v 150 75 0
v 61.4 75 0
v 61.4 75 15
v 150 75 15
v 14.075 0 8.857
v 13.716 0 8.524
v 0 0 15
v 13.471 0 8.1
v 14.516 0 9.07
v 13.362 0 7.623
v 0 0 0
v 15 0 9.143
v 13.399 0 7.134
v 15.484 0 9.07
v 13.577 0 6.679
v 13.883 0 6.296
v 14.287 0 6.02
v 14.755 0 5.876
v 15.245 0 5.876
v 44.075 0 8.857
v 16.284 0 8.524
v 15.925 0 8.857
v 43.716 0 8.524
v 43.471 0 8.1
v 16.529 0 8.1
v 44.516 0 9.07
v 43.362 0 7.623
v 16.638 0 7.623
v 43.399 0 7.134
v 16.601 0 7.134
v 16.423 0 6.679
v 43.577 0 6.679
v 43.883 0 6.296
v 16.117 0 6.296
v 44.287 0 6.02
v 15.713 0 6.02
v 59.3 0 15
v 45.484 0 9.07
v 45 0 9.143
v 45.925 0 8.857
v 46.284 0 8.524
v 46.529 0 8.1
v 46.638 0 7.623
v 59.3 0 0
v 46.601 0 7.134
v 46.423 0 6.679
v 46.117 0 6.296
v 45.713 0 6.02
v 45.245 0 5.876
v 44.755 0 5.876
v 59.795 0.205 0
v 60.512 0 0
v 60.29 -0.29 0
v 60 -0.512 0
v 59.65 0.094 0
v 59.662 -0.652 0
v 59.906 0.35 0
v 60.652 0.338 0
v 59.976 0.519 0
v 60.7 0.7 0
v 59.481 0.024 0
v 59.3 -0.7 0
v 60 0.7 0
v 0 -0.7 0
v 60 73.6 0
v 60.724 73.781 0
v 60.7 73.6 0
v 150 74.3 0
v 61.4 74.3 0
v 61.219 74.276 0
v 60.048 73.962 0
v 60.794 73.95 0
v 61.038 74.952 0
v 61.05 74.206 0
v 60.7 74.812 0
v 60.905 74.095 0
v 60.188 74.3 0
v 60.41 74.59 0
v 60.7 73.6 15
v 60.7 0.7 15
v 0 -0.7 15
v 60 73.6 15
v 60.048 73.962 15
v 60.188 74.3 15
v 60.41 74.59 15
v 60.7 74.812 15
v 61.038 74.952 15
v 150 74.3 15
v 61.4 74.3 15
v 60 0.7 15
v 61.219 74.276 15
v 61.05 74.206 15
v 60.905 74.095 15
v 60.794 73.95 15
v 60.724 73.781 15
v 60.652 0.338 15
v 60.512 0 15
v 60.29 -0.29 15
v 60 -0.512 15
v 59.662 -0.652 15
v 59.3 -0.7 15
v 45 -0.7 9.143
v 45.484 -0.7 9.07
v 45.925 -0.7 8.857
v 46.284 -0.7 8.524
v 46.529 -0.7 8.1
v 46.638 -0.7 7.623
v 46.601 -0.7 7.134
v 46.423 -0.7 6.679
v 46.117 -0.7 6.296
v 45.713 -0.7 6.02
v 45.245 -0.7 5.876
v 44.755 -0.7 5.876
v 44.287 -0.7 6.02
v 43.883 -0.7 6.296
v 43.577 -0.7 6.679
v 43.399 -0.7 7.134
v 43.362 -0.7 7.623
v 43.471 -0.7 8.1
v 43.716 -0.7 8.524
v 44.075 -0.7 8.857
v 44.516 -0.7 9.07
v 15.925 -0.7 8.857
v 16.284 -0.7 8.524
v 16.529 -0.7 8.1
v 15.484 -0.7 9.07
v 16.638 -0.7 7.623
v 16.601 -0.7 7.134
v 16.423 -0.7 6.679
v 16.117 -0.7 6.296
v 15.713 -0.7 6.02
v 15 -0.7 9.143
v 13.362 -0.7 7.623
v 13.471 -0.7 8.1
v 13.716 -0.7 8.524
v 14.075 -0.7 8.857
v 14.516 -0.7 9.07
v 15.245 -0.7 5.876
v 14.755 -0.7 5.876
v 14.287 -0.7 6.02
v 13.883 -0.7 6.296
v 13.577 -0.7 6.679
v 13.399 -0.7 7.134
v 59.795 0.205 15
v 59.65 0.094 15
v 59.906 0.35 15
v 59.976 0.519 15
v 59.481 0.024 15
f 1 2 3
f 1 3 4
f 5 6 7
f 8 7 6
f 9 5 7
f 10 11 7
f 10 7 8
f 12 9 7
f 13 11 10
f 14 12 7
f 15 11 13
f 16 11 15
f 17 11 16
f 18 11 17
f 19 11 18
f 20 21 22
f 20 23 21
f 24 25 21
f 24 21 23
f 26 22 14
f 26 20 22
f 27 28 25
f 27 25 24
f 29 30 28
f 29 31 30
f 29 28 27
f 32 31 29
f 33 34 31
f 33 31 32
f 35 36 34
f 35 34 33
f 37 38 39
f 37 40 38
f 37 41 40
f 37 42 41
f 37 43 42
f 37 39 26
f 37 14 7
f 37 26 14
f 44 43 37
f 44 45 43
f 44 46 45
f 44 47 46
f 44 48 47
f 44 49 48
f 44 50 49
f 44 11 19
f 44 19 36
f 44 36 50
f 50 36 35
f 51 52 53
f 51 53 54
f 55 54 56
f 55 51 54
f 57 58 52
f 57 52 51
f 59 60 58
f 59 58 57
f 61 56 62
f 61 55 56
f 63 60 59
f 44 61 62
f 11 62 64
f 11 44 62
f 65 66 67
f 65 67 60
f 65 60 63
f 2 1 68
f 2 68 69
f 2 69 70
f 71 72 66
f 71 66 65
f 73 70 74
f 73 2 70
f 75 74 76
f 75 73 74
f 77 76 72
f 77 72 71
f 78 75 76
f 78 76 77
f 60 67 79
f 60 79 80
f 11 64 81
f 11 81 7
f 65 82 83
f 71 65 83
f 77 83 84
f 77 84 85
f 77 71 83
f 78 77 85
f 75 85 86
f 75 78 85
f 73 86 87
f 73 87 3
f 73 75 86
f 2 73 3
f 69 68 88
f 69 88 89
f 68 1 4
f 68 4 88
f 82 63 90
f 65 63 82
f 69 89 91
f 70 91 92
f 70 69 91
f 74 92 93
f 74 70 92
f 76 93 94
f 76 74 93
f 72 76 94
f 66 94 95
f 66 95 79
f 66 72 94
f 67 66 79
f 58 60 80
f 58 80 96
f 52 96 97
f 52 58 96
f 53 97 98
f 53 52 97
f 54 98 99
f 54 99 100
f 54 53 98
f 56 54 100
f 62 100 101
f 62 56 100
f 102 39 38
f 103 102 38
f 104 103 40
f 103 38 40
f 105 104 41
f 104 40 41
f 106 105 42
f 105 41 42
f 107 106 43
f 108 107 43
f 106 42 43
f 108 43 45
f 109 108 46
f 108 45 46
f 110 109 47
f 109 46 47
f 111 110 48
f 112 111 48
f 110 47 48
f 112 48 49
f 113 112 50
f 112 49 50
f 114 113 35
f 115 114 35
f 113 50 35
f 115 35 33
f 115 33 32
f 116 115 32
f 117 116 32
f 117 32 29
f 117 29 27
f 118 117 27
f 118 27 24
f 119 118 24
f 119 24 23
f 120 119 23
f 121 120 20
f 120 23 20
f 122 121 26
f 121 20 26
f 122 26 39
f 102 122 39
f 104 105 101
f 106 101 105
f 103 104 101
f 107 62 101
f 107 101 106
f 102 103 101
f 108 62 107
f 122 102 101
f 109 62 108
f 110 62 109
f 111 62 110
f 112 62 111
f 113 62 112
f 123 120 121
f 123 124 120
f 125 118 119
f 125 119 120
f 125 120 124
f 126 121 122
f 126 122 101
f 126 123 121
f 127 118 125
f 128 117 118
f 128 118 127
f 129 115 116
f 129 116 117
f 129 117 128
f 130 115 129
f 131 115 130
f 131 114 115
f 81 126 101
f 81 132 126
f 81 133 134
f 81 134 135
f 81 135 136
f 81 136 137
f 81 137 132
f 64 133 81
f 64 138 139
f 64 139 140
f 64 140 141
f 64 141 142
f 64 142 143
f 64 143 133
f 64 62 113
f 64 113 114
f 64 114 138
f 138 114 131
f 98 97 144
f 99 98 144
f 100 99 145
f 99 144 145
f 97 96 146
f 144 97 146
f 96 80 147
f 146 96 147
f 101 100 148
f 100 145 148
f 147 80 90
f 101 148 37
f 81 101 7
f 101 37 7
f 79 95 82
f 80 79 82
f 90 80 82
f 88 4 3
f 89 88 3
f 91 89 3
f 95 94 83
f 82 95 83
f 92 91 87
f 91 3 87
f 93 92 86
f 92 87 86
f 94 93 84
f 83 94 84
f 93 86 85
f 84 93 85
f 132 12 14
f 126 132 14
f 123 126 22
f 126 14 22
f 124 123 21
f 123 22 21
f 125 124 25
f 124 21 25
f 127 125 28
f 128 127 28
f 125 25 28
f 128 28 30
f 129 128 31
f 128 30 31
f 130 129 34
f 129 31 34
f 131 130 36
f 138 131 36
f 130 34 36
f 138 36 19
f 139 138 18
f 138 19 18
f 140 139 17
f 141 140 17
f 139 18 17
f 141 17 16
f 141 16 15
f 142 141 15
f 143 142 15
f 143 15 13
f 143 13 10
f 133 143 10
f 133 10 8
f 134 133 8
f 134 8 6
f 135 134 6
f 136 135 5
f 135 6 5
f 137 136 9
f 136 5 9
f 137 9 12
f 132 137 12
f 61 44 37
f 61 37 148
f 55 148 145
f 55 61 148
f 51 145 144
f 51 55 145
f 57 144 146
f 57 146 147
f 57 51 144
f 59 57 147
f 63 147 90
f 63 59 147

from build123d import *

# Parameters (mm, degrees)
BASE_FLANGE1_DEPTH = 15
SKETCH6_R          = 1.64265796
CUT_EXTRUDE1_DEPTH = 0.7


# Sheet-metal steps are written as plain solids
with BuildPart() as part:
    # Sketch1 → Base-Flange1 (new body)
    with BuildSketch(Plane.XY):
        with BuildLine():
            Line((0, 0), (59.3, 0))
            ThreePointArc((59.3, 0), (59.794974747, 0.205025253), (60, 0.7))
            Line((60, 0.7), (60, 73.6))
            ThreePointArc((60, 73.6), (60.410050506, 74.589949494), (61.4, 75))
            Line((61.4, 75), (150, 75))
            Line((150, 75), (150, 74.3))
            Line((150, 74.3), (61.4, 74.3))
            ThreePointArc((61.4, 74.3), (60.905025253, 74.094974747), (60.7, 73.6))
            Line((60.7, 73.6), (60.7, 0.7))
            ThreePointArc((60.7, 0.7), (60.289949494, -0.289949494), (59.3, -0.7))
            Line((59.3, -0.7), (0, -0.7))
            Line((0, -0.7), (0, 0))
        make_face()
    extrude(amount=BASE_FLANGE1_DEPTH)

    # Sketch6 → Cut-Extrude1 (cut)
    with BuildSketch(Plane(origin=(0, 0, 0), x_dir=(1, 0, 0), z_dir=(0, 1, 0))):
        with Locations(Location((15, -7.5, 0), (0, 0, 270))):
            Circle(SKETCH6_R)
        with Locations(Location((45, -7.5, 0), (0, 0, 270))):
            Circle(SKETCH6_R)
    extrude(amount=-CUT_EXTRUDE1_DEPTH, mode=Mode.SUBTRACT)


solid = part.part
